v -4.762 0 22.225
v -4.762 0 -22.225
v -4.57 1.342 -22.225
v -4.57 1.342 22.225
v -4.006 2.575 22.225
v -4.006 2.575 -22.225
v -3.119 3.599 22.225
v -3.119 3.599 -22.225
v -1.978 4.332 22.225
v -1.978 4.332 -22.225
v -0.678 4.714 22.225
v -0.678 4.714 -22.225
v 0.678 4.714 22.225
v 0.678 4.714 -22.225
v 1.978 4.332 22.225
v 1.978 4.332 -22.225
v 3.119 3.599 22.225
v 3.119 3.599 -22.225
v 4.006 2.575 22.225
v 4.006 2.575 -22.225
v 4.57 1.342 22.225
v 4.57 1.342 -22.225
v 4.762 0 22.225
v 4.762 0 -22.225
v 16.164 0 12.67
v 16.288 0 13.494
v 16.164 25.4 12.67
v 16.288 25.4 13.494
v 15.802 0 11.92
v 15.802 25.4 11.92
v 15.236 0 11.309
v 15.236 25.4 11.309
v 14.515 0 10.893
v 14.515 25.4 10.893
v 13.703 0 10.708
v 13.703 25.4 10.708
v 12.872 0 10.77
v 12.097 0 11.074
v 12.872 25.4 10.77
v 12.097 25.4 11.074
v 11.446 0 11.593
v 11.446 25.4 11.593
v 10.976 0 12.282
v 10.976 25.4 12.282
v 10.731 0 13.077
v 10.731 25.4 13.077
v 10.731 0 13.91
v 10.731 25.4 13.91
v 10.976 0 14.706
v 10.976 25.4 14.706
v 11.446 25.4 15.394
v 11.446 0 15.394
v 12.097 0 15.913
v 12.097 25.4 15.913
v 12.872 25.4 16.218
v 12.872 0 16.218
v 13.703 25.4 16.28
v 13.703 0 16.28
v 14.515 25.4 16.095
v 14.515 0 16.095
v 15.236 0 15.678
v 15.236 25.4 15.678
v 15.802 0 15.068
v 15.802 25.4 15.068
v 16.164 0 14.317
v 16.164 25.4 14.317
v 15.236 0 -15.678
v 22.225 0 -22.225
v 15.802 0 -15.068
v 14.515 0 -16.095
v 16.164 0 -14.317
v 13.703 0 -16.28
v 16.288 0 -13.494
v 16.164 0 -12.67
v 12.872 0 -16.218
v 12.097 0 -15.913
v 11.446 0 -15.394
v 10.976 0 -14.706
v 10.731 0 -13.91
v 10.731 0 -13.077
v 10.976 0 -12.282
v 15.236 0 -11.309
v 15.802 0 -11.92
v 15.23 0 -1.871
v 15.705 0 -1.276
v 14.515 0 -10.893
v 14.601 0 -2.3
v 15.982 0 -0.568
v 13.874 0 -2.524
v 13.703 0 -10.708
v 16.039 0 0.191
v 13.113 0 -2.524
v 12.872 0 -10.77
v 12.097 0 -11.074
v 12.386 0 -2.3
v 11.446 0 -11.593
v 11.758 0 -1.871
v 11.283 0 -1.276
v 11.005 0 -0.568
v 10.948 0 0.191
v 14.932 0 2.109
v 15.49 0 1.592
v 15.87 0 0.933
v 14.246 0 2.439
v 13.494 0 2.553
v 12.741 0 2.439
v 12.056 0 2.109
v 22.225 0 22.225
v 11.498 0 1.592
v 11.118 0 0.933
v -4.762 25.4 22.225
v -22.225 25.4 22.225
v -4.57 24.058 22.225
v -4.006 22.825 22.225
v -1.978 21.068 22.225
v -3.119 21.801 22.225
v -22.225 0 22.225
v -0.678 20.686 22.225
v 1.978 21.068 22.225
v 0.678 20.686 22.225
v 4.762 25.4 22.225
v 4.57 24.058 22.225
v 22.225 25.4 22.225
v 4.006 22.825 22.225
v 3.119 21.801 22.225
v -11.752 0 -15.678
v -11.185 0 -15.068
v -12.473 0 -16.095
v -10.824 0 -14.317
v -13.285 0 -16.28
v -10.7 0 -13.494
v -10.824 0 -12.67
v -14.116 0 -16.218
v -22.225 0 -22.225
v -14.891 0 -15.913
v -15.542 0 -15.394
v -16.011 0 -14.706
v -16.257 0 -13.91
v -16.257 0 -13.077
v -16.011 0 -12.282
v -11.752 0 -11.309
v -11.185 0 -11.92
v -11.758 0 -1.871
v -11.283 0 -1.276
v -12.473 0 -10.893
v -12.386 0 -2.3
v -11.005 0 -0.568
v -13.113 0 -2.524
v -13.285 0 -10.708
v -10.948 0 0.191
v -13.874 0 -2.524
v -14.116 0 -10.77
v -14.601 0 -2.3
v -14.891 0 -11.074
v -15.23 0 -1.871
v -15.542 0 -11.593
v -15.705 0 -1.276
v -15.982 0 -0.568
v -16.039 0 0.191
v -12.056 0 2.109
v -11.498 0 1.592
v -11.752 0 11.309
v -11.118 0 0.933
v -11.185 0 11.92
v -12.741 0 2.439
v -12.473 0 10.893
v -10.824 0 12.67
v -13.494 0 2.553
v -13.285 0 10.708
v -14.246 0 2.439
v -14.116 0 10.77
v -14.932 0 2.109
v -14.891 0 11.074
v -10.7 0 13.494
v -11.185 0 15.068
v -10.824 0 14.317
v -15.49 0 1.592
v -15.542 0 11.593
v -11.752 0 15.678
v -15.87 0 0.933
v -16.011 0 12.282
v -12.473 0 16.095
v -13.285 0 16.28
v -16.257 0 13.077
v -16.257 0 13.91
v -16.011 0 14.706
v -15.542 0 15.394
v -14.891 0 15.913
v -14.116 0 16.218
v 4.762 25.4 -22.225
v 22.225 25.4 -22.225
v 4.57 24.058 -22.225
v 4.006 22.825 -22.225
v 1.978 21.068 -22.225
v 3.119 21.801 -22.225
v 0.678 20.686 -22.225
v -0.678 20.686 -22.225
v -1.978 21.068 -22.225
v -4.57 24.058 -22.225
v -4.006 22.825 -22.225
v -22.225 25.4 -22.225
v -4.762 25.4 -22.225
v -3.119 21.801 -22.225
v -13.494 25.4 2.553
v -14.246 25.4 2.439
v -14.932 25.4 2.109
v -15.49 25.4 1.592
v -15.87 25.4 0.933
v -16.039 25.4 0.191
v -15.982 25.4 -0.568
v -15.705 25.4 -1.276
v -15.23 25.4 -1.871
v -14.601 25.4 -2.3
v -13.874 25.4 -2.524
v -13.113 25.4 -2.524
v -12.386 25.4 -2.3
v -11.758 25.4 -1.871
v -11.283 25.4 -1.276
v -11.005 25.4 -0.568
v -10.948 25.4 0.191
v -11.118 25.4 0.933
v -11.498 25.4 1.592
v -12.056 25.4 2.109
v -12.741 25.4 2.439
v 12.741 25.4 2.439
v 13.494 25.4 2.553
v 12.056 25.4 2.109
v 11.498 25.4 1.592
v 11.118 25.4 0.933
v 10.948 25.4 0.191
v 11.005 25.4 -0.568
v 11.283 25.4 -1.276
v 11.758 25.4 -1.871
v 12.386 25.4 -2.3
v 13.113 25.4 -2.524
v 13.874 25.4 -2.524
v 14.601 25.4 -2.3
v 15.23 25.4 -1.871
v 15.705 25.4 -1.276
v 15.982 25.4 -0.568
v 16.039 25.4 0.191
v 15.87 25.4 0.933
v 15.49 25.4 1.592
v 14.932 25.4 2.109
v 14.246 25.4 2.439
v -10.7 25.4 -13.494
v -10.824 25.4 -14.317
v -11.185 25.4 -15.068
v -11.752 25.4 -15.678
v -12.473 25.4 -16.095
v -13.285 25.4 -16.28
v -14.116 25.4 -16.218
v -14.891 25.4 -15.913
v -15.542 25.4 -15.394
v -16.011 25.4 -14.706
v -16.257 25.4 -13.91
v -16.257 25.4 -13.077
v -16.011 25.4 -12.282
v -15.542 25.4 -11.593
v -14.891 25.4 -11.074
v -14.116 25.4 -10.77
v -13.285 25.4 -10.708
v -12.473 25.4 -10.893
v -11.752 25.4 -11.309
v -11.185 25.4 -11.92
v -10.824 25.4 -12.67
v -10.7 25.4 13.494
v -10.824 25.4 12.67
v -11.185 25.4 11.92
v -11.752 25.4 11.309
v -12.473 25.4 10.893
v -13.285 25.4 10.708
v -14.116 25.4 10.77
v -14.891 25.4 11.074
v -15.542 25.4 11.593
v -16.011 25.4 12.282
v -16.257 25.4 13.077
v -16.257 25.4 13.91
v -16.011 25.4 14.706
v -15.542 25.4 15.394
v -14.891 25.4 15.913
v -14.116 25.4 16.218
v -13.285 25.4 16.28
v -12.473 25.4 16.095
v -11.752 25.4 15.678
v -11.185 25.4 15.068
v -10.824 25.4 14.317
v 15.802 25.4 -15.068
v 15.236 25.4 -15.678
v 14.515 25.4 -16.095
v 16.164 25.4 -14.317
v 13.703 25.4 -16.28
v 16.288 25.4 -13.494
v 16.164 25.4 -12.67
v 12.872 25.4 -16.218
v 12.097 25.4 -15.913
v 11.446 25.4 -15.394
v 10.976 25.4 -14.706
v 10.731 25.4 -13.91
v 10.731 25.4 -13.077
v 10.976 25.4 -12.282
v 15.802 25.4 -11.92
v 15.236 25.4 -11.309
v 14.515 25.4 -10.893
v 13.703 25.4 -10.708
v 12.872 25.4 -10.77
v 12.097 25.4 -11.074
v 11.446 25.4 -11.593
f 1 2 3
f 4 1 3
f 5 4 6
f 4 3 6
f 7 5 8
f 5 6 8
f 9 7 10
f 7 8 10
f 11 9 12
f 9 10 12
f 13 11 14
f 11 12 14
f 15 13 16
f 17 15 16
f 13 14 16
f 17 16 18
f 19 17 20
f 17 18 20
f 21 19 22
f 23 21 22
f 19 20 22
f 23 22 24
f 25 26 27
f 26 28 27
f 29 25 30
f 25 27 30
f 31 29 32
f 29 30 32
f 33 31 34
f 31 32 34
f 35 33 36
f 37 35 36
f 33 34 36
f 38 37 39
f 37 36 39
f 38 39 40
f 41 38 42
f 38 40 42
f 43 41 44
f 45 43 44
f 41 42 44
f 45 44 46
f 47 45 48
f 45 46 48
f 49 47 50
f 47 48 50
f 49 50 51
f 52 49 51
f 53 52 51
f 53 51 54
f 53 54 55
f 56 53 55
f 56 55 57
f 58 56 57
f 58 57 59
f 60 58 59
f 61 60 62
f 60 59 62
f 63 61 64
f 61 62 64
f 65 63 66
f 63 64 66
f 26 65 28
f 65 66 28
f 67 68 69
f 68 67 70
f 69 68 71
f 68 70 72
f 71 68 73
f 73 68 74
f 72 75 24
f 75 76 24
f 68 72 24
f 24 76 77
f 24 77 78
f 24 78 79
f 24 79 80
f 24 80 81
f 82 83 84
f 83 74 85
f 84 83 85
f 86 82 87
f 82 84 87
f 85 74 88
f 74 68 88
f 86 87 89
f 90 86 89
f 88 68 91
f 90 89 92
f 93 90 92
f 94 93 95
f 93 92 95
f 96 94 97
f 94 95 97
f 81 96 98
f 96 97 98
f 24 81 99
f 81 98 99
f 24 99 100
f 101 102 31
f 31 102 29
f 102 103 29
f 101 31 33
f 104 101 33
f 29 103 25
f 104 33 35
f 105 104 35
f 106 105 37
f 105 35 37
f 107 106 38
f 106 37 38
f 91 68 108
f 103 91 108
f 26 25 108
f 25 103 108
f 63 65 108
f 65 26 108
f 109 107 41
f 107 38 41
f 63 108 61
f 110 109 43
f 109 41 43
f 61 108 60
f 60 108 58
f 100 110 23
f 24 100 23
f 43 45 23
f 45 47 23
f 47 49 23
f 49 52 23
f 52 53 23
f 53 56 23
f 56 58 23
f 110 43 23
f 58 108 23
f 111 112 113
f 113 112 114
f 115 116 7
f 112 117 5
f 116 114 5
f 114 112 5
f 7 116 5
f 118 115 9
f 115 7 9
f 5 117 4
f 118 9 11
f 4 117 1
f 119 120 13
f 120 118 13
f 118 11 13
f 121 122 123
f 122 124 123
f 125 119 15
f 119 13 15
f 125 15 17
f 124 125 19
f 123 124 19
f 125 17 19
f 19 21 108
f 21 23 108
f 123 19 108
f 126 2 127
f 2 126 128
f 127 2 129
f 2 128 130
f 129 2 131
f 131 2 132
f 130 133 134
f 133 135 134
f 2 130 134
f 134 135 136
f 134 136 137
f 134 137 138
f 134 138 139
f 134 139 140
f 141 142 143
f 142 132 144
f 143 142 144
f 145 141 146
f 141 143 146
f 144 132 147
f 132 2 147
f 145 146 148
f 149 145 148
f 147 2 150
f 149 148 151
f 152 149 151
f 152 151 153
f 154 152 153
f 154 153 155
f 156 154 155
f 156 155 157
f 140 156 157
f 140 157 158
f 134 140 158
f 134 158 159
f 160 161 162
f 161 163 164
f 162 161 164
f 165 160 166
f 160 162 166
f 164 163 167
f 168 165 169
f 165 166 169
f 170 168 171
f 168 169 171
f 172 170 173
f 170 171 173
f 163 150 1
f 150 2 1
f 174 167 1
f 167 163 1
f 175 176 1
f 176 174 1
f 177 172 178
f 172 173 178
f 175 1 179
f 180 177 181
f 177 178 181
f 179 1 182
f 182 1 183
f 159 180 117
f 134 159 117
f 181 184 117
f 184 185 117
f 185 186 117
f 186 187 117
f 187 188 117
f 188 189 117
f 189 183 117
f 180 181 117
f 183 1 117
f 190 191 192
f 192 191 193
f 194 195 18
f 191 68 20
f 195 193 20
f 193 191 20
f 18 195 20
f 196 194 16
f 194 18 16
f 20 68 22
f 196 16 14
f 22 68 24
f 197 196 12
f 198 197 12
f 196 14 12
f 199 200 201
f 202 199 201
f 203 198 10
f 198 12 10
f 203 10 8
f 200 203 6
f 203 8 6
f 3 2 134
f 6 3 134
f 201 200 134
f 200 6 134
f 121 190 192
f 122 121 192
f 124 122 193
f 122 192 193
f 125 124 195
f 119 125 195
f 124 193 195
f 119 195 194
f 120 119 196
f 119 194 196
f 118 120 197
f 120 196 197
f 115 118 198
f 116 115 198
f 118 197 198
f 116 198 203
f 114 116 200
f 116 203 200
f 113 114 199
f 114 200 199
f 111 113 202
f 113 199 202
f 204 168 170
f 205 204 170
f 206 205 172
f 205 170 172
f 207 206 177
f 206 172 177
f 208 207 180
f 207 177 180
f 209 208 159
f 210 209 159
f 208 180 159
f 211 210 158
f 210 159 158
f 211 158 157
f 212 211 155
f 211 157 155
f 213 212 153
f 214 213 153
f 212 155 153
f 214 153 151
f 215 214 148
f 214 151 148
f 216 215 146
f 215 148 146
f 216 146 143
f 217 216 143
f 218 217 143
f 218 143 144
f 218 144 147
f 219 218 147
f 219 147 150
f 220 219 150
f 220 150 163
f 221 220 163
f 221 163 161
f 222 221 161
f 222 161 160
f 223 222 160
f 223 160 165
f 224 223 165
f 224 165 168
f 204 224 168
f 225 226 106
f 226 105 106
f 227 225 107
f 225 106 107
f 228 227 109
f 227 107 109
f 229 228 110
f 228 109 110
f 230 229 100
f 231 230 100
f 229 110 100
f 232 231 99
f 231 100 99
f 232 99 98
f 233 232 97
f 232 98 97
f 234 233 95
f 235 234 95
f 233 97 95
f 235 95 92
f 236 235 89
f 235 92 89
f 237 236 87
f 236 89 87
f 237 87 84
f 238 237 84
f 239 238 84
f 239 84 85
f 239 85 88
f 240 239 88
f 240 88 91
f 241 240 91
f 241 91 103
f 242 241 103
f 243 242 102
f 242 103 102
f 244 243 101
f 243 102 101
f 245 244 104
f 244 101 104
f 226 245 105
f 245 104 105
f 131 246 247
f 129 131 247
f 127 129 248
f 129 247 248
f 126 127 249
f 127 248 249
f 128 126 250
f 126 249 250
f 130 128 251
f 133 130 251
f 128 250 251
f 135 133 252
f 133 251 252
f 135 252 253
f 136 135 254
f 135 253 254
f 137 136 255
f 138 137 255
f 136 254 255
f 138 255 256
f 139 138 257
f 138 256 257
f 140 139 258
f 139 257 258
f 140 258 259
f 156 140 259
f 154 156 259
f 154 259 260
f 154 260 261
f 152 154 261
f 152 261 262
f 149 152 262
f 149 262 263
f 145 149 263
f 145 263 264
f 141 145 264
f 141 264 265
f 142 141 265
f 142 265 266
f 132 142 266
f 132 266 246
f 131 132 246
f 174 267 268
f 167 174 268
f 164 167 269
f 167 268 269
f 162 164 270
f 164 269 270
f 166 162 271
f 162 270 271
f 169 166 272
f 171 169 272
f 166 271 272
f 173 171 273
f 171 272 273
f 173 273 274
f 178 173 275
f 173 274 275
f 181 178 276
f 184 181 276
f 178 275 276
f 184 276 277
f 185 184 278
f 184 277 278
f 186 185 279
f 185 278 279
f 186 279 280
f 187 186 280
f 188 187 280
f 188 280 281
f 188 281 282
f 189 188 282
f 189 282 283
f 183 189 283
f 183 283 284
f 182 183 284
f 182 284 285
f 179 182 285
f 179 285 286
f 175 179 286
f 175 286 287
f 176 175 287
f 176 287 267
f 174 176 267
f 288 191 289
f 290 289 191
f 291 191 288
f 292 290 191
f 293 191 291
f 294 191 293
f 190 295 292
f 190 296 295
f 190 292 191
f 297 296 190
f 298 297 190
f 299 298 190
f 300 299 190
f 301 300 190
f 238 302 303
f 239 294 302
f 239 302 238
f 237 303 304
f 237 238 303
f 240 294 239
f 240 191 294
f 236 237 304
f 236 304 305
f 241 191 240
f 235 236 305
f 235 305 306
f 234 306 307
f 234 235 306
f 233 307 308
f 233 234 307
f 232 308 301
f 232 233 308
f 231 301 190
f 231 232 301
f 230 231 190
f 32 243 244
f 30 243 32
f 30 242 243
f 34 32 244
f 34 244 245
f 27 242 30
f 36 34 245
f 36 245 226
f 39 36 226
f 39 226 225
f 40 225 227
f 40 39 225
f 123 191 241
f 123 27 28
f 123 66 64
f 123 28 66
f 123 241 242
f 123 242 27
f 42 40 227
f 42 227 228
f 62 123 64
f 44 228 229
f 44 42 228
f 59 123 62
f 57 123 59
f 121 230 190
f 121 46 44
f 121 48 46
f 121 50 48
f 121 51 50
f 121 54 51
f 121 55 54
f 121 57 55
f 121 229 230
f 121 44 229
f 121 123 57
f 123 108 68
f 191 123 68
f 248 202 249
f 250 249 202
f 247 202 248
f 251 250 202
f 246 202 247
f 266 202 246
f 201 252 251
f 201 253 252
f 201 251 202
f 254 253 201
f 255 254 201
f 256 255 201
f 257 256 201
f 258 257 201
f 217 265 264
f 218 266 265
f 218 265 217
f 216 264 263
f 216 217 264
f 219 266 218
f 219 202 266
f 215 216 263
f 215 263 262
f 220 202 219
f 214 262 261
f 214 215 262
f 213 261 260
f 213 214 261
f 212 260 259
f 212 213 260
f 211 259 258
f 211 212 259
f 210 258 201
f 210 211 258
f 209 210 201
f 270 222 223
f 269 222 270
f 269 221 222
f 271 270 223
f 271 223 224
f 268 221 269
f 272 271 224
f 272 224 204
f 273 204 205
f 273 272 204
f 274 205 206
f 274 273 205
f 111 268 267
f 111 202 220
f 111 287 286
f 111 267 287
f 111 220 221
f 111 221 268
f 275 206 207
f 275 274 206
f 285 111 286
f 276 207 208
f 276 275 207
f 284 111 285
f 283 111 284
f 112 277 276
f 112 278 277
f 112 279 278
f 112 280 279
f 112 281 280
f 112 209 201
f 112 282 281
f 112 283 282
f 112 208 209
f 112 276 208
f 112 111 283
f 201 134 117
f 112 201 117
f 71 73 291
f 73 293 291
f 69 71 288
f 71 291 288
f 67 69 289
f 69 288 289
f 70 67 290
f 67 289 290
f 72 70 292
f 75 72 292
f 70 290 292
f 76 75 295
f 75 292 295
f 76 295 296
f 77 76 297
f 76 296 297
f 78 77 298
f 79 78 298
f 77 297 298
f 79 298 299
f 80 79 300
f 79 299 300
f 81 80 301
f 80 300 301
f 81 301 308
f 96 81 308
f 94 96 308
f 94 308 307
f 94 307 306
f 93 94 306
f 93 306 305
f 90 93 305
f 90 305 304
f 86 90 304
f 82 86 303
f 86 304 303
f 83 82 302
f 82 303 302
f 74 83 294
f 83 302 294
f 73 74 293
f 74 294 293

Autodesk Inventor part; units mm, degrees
ref_plane "YZ Plane" through (0, 0, 0) normal (1, 0, 0) x (0, 1, 0)
ref_plane "XZ Plane" through (0, 0, 0) normal (0, 1, 0) x (-1, 0, 0)
ref_plane "XY Plane" through (0, 0, 0) normal (0, 0, 1) x (1, 0, 0)
sketch "Sketch1" plane through (0, 0, 0) normal (0, 1, 0) x (-1, 0, 0)
  line L0 (-22.225, 22.225) -> (-22.225, -22.225)
  line L1 (-22.225, -22.225) -> (22.225, -22.225)
  line L2 (22.225, -22.225) -> (22.225, 22.225)
  line L3 (22.225, 22.225) -> (-22.225, 22.225)
  line L4 (-22.225, 22.225) -> (22.225, -22.225) construction
  line L5 (-22.225, -22.225) -> (22.225, 22.225) construction
  point P0 (0, 0)
  dimension "d4" = 44.45
extrude "Extrusion1" add sketch "Sketch1" along normal blind 25.4
sketch "Sketch3" plane through (-22.225, 0, 22.225) normal (0, 0, 1) x (1, 0, 0)
  line L0 (44.45, 25.4) -> (0, 25.4) construction
  point P0 (22.225, 0)
  point P1 (22.225, 25.4)
  point P2 (22.225, 0)
hole "Hole1" at (0, 25.4, 22.225) at (0, 0, 22.225) direction (0, 0, -1) diameter 9.525 end through all
sketch "Sketch4" plane through (0, 25.4, 0) normal (0, 1, 0) x (1, 0, 0)
  line L0 (-22.225, 22.225) -> (-22.225, -22.225) projected
  line L1 (22.225, -22.225) -> (22.225, 22.225) projected
  line L2 (-22.225, -22.225) -> (-4.7625, -22.225) projected
  line L3 (4.7625, -22.225) -> (22.225, -22.225) projected
  point P0 (0, 0)
  point P1 (-13.4938, 0)
  point P2 (13.4938, 0)
  dimension "d16" = 8.7312
  dimension "d17" = 8.7312
  dimension "d25" = 22.225
  dimension "d26" = 22.225
hole "Hole2" at (-13.4938, 25.4, 0) at (13.4938, 25.4, 0) direction (0, -1, 0) diameter 5.1054 end through all clearance for "Flat Head Machine Screw (82)" size "#10" standard "Ansi Unified Screw Threads"
sketch "Sketch5" plane through (0, 25.4, 0) normal (0, 1, 0) x (1, 0, 0)
  line L0 (-13.4938, -13.4938) -> (13.4938, -13.4938) construction
  line L1 (13.4938, -13.4938) -> (13.4938, 13.4938) construction
  line L2 (13.4938, 13.4938) -> (-13.4938, 13.4938) construction
  line L3 (-13.4938, 13.4938) -> (-13.4938, -13.4938) construction
  line L4 (-13.4938, -13.4938) -> (13.4938, 13.4938) construction
  line L5 (13.4938, -13.4938) -> (-13.4938, 13.4938) construction
  line L6 (-22.225, -22.225) -> (-4.7625, -22.225) projected
  line L7 (-22.225, 22.225) -> (-22.225, -22.225) projected
  circle A0 centre (-13.4938, -13.4938) radius 2.794
  circle A1 centre (13.4938, -13.4938) radius 2.794
  circle A2 centre (13.4938, 13.4938) radius 2.794
  circle A3 centre (-13.4938, 13.4938) radius 2.794
  point P0 (0, 0)
  dimension "d27" = 8.7312
  dimension "d28" = 8.7312
  dimension "d29" = 5.588
extrude "Extrusion2" cut sketch "Sketch5" against normal through all
equation "\"d4\" = baseWidth"
equation "\"d6\" = heightOfMiddleSection"
equation "\"d9\" = bottomHoleDiam"
equation "\"d16\" = edgeToBoltHole"
equation "\"d17\" = edgeToBoltHole"
equation "\"d25\" = 0.5 * baseWidth"
equation "\"d26\" = 0.5 * baseWidth"
equation "\"d27\" = edgeToBoltHole"
equation "\"d28\" = edgeToBoltHole"
equation "\"d29\" = supportHoleDiam"
equation "\"bottomHoleDiam\" = 9.525"
equation "\"baseWidth\" = 44.45"
equation "\"deltaBottomToTop\" = 27.94"
equation "\"d0\" = baseWidth"
equation "\"d1\" = heightOfBottomHole"
equation "\"d2\" = 0"
equation "\"d3\" = bottomHoleDiam"
equation "\"d5\" = 0"
equation "\"height\" = deltaBottomToTop + heightOfBottomHole + heightOfTopHole"
equation "\"topHoleDiam\" = 9.525"
equation "\"edgeToBoltHole\" = -0.25 * bottomHoleDiam + 0.25 * baseWidth"
equation "\"heightOfMiddleSection\" = 25.4"
equation "\"baseLength\" = 44.45"
equation "\"supportHoleDiam\" = 5.588"
equation "\"heightOfBottomHole\" = 11.1125"
equation "\"heightOfTopHole\" = 11.1125"
properties part number "MiddleOfSquareSupport" material "PC/ABS Plastic"
